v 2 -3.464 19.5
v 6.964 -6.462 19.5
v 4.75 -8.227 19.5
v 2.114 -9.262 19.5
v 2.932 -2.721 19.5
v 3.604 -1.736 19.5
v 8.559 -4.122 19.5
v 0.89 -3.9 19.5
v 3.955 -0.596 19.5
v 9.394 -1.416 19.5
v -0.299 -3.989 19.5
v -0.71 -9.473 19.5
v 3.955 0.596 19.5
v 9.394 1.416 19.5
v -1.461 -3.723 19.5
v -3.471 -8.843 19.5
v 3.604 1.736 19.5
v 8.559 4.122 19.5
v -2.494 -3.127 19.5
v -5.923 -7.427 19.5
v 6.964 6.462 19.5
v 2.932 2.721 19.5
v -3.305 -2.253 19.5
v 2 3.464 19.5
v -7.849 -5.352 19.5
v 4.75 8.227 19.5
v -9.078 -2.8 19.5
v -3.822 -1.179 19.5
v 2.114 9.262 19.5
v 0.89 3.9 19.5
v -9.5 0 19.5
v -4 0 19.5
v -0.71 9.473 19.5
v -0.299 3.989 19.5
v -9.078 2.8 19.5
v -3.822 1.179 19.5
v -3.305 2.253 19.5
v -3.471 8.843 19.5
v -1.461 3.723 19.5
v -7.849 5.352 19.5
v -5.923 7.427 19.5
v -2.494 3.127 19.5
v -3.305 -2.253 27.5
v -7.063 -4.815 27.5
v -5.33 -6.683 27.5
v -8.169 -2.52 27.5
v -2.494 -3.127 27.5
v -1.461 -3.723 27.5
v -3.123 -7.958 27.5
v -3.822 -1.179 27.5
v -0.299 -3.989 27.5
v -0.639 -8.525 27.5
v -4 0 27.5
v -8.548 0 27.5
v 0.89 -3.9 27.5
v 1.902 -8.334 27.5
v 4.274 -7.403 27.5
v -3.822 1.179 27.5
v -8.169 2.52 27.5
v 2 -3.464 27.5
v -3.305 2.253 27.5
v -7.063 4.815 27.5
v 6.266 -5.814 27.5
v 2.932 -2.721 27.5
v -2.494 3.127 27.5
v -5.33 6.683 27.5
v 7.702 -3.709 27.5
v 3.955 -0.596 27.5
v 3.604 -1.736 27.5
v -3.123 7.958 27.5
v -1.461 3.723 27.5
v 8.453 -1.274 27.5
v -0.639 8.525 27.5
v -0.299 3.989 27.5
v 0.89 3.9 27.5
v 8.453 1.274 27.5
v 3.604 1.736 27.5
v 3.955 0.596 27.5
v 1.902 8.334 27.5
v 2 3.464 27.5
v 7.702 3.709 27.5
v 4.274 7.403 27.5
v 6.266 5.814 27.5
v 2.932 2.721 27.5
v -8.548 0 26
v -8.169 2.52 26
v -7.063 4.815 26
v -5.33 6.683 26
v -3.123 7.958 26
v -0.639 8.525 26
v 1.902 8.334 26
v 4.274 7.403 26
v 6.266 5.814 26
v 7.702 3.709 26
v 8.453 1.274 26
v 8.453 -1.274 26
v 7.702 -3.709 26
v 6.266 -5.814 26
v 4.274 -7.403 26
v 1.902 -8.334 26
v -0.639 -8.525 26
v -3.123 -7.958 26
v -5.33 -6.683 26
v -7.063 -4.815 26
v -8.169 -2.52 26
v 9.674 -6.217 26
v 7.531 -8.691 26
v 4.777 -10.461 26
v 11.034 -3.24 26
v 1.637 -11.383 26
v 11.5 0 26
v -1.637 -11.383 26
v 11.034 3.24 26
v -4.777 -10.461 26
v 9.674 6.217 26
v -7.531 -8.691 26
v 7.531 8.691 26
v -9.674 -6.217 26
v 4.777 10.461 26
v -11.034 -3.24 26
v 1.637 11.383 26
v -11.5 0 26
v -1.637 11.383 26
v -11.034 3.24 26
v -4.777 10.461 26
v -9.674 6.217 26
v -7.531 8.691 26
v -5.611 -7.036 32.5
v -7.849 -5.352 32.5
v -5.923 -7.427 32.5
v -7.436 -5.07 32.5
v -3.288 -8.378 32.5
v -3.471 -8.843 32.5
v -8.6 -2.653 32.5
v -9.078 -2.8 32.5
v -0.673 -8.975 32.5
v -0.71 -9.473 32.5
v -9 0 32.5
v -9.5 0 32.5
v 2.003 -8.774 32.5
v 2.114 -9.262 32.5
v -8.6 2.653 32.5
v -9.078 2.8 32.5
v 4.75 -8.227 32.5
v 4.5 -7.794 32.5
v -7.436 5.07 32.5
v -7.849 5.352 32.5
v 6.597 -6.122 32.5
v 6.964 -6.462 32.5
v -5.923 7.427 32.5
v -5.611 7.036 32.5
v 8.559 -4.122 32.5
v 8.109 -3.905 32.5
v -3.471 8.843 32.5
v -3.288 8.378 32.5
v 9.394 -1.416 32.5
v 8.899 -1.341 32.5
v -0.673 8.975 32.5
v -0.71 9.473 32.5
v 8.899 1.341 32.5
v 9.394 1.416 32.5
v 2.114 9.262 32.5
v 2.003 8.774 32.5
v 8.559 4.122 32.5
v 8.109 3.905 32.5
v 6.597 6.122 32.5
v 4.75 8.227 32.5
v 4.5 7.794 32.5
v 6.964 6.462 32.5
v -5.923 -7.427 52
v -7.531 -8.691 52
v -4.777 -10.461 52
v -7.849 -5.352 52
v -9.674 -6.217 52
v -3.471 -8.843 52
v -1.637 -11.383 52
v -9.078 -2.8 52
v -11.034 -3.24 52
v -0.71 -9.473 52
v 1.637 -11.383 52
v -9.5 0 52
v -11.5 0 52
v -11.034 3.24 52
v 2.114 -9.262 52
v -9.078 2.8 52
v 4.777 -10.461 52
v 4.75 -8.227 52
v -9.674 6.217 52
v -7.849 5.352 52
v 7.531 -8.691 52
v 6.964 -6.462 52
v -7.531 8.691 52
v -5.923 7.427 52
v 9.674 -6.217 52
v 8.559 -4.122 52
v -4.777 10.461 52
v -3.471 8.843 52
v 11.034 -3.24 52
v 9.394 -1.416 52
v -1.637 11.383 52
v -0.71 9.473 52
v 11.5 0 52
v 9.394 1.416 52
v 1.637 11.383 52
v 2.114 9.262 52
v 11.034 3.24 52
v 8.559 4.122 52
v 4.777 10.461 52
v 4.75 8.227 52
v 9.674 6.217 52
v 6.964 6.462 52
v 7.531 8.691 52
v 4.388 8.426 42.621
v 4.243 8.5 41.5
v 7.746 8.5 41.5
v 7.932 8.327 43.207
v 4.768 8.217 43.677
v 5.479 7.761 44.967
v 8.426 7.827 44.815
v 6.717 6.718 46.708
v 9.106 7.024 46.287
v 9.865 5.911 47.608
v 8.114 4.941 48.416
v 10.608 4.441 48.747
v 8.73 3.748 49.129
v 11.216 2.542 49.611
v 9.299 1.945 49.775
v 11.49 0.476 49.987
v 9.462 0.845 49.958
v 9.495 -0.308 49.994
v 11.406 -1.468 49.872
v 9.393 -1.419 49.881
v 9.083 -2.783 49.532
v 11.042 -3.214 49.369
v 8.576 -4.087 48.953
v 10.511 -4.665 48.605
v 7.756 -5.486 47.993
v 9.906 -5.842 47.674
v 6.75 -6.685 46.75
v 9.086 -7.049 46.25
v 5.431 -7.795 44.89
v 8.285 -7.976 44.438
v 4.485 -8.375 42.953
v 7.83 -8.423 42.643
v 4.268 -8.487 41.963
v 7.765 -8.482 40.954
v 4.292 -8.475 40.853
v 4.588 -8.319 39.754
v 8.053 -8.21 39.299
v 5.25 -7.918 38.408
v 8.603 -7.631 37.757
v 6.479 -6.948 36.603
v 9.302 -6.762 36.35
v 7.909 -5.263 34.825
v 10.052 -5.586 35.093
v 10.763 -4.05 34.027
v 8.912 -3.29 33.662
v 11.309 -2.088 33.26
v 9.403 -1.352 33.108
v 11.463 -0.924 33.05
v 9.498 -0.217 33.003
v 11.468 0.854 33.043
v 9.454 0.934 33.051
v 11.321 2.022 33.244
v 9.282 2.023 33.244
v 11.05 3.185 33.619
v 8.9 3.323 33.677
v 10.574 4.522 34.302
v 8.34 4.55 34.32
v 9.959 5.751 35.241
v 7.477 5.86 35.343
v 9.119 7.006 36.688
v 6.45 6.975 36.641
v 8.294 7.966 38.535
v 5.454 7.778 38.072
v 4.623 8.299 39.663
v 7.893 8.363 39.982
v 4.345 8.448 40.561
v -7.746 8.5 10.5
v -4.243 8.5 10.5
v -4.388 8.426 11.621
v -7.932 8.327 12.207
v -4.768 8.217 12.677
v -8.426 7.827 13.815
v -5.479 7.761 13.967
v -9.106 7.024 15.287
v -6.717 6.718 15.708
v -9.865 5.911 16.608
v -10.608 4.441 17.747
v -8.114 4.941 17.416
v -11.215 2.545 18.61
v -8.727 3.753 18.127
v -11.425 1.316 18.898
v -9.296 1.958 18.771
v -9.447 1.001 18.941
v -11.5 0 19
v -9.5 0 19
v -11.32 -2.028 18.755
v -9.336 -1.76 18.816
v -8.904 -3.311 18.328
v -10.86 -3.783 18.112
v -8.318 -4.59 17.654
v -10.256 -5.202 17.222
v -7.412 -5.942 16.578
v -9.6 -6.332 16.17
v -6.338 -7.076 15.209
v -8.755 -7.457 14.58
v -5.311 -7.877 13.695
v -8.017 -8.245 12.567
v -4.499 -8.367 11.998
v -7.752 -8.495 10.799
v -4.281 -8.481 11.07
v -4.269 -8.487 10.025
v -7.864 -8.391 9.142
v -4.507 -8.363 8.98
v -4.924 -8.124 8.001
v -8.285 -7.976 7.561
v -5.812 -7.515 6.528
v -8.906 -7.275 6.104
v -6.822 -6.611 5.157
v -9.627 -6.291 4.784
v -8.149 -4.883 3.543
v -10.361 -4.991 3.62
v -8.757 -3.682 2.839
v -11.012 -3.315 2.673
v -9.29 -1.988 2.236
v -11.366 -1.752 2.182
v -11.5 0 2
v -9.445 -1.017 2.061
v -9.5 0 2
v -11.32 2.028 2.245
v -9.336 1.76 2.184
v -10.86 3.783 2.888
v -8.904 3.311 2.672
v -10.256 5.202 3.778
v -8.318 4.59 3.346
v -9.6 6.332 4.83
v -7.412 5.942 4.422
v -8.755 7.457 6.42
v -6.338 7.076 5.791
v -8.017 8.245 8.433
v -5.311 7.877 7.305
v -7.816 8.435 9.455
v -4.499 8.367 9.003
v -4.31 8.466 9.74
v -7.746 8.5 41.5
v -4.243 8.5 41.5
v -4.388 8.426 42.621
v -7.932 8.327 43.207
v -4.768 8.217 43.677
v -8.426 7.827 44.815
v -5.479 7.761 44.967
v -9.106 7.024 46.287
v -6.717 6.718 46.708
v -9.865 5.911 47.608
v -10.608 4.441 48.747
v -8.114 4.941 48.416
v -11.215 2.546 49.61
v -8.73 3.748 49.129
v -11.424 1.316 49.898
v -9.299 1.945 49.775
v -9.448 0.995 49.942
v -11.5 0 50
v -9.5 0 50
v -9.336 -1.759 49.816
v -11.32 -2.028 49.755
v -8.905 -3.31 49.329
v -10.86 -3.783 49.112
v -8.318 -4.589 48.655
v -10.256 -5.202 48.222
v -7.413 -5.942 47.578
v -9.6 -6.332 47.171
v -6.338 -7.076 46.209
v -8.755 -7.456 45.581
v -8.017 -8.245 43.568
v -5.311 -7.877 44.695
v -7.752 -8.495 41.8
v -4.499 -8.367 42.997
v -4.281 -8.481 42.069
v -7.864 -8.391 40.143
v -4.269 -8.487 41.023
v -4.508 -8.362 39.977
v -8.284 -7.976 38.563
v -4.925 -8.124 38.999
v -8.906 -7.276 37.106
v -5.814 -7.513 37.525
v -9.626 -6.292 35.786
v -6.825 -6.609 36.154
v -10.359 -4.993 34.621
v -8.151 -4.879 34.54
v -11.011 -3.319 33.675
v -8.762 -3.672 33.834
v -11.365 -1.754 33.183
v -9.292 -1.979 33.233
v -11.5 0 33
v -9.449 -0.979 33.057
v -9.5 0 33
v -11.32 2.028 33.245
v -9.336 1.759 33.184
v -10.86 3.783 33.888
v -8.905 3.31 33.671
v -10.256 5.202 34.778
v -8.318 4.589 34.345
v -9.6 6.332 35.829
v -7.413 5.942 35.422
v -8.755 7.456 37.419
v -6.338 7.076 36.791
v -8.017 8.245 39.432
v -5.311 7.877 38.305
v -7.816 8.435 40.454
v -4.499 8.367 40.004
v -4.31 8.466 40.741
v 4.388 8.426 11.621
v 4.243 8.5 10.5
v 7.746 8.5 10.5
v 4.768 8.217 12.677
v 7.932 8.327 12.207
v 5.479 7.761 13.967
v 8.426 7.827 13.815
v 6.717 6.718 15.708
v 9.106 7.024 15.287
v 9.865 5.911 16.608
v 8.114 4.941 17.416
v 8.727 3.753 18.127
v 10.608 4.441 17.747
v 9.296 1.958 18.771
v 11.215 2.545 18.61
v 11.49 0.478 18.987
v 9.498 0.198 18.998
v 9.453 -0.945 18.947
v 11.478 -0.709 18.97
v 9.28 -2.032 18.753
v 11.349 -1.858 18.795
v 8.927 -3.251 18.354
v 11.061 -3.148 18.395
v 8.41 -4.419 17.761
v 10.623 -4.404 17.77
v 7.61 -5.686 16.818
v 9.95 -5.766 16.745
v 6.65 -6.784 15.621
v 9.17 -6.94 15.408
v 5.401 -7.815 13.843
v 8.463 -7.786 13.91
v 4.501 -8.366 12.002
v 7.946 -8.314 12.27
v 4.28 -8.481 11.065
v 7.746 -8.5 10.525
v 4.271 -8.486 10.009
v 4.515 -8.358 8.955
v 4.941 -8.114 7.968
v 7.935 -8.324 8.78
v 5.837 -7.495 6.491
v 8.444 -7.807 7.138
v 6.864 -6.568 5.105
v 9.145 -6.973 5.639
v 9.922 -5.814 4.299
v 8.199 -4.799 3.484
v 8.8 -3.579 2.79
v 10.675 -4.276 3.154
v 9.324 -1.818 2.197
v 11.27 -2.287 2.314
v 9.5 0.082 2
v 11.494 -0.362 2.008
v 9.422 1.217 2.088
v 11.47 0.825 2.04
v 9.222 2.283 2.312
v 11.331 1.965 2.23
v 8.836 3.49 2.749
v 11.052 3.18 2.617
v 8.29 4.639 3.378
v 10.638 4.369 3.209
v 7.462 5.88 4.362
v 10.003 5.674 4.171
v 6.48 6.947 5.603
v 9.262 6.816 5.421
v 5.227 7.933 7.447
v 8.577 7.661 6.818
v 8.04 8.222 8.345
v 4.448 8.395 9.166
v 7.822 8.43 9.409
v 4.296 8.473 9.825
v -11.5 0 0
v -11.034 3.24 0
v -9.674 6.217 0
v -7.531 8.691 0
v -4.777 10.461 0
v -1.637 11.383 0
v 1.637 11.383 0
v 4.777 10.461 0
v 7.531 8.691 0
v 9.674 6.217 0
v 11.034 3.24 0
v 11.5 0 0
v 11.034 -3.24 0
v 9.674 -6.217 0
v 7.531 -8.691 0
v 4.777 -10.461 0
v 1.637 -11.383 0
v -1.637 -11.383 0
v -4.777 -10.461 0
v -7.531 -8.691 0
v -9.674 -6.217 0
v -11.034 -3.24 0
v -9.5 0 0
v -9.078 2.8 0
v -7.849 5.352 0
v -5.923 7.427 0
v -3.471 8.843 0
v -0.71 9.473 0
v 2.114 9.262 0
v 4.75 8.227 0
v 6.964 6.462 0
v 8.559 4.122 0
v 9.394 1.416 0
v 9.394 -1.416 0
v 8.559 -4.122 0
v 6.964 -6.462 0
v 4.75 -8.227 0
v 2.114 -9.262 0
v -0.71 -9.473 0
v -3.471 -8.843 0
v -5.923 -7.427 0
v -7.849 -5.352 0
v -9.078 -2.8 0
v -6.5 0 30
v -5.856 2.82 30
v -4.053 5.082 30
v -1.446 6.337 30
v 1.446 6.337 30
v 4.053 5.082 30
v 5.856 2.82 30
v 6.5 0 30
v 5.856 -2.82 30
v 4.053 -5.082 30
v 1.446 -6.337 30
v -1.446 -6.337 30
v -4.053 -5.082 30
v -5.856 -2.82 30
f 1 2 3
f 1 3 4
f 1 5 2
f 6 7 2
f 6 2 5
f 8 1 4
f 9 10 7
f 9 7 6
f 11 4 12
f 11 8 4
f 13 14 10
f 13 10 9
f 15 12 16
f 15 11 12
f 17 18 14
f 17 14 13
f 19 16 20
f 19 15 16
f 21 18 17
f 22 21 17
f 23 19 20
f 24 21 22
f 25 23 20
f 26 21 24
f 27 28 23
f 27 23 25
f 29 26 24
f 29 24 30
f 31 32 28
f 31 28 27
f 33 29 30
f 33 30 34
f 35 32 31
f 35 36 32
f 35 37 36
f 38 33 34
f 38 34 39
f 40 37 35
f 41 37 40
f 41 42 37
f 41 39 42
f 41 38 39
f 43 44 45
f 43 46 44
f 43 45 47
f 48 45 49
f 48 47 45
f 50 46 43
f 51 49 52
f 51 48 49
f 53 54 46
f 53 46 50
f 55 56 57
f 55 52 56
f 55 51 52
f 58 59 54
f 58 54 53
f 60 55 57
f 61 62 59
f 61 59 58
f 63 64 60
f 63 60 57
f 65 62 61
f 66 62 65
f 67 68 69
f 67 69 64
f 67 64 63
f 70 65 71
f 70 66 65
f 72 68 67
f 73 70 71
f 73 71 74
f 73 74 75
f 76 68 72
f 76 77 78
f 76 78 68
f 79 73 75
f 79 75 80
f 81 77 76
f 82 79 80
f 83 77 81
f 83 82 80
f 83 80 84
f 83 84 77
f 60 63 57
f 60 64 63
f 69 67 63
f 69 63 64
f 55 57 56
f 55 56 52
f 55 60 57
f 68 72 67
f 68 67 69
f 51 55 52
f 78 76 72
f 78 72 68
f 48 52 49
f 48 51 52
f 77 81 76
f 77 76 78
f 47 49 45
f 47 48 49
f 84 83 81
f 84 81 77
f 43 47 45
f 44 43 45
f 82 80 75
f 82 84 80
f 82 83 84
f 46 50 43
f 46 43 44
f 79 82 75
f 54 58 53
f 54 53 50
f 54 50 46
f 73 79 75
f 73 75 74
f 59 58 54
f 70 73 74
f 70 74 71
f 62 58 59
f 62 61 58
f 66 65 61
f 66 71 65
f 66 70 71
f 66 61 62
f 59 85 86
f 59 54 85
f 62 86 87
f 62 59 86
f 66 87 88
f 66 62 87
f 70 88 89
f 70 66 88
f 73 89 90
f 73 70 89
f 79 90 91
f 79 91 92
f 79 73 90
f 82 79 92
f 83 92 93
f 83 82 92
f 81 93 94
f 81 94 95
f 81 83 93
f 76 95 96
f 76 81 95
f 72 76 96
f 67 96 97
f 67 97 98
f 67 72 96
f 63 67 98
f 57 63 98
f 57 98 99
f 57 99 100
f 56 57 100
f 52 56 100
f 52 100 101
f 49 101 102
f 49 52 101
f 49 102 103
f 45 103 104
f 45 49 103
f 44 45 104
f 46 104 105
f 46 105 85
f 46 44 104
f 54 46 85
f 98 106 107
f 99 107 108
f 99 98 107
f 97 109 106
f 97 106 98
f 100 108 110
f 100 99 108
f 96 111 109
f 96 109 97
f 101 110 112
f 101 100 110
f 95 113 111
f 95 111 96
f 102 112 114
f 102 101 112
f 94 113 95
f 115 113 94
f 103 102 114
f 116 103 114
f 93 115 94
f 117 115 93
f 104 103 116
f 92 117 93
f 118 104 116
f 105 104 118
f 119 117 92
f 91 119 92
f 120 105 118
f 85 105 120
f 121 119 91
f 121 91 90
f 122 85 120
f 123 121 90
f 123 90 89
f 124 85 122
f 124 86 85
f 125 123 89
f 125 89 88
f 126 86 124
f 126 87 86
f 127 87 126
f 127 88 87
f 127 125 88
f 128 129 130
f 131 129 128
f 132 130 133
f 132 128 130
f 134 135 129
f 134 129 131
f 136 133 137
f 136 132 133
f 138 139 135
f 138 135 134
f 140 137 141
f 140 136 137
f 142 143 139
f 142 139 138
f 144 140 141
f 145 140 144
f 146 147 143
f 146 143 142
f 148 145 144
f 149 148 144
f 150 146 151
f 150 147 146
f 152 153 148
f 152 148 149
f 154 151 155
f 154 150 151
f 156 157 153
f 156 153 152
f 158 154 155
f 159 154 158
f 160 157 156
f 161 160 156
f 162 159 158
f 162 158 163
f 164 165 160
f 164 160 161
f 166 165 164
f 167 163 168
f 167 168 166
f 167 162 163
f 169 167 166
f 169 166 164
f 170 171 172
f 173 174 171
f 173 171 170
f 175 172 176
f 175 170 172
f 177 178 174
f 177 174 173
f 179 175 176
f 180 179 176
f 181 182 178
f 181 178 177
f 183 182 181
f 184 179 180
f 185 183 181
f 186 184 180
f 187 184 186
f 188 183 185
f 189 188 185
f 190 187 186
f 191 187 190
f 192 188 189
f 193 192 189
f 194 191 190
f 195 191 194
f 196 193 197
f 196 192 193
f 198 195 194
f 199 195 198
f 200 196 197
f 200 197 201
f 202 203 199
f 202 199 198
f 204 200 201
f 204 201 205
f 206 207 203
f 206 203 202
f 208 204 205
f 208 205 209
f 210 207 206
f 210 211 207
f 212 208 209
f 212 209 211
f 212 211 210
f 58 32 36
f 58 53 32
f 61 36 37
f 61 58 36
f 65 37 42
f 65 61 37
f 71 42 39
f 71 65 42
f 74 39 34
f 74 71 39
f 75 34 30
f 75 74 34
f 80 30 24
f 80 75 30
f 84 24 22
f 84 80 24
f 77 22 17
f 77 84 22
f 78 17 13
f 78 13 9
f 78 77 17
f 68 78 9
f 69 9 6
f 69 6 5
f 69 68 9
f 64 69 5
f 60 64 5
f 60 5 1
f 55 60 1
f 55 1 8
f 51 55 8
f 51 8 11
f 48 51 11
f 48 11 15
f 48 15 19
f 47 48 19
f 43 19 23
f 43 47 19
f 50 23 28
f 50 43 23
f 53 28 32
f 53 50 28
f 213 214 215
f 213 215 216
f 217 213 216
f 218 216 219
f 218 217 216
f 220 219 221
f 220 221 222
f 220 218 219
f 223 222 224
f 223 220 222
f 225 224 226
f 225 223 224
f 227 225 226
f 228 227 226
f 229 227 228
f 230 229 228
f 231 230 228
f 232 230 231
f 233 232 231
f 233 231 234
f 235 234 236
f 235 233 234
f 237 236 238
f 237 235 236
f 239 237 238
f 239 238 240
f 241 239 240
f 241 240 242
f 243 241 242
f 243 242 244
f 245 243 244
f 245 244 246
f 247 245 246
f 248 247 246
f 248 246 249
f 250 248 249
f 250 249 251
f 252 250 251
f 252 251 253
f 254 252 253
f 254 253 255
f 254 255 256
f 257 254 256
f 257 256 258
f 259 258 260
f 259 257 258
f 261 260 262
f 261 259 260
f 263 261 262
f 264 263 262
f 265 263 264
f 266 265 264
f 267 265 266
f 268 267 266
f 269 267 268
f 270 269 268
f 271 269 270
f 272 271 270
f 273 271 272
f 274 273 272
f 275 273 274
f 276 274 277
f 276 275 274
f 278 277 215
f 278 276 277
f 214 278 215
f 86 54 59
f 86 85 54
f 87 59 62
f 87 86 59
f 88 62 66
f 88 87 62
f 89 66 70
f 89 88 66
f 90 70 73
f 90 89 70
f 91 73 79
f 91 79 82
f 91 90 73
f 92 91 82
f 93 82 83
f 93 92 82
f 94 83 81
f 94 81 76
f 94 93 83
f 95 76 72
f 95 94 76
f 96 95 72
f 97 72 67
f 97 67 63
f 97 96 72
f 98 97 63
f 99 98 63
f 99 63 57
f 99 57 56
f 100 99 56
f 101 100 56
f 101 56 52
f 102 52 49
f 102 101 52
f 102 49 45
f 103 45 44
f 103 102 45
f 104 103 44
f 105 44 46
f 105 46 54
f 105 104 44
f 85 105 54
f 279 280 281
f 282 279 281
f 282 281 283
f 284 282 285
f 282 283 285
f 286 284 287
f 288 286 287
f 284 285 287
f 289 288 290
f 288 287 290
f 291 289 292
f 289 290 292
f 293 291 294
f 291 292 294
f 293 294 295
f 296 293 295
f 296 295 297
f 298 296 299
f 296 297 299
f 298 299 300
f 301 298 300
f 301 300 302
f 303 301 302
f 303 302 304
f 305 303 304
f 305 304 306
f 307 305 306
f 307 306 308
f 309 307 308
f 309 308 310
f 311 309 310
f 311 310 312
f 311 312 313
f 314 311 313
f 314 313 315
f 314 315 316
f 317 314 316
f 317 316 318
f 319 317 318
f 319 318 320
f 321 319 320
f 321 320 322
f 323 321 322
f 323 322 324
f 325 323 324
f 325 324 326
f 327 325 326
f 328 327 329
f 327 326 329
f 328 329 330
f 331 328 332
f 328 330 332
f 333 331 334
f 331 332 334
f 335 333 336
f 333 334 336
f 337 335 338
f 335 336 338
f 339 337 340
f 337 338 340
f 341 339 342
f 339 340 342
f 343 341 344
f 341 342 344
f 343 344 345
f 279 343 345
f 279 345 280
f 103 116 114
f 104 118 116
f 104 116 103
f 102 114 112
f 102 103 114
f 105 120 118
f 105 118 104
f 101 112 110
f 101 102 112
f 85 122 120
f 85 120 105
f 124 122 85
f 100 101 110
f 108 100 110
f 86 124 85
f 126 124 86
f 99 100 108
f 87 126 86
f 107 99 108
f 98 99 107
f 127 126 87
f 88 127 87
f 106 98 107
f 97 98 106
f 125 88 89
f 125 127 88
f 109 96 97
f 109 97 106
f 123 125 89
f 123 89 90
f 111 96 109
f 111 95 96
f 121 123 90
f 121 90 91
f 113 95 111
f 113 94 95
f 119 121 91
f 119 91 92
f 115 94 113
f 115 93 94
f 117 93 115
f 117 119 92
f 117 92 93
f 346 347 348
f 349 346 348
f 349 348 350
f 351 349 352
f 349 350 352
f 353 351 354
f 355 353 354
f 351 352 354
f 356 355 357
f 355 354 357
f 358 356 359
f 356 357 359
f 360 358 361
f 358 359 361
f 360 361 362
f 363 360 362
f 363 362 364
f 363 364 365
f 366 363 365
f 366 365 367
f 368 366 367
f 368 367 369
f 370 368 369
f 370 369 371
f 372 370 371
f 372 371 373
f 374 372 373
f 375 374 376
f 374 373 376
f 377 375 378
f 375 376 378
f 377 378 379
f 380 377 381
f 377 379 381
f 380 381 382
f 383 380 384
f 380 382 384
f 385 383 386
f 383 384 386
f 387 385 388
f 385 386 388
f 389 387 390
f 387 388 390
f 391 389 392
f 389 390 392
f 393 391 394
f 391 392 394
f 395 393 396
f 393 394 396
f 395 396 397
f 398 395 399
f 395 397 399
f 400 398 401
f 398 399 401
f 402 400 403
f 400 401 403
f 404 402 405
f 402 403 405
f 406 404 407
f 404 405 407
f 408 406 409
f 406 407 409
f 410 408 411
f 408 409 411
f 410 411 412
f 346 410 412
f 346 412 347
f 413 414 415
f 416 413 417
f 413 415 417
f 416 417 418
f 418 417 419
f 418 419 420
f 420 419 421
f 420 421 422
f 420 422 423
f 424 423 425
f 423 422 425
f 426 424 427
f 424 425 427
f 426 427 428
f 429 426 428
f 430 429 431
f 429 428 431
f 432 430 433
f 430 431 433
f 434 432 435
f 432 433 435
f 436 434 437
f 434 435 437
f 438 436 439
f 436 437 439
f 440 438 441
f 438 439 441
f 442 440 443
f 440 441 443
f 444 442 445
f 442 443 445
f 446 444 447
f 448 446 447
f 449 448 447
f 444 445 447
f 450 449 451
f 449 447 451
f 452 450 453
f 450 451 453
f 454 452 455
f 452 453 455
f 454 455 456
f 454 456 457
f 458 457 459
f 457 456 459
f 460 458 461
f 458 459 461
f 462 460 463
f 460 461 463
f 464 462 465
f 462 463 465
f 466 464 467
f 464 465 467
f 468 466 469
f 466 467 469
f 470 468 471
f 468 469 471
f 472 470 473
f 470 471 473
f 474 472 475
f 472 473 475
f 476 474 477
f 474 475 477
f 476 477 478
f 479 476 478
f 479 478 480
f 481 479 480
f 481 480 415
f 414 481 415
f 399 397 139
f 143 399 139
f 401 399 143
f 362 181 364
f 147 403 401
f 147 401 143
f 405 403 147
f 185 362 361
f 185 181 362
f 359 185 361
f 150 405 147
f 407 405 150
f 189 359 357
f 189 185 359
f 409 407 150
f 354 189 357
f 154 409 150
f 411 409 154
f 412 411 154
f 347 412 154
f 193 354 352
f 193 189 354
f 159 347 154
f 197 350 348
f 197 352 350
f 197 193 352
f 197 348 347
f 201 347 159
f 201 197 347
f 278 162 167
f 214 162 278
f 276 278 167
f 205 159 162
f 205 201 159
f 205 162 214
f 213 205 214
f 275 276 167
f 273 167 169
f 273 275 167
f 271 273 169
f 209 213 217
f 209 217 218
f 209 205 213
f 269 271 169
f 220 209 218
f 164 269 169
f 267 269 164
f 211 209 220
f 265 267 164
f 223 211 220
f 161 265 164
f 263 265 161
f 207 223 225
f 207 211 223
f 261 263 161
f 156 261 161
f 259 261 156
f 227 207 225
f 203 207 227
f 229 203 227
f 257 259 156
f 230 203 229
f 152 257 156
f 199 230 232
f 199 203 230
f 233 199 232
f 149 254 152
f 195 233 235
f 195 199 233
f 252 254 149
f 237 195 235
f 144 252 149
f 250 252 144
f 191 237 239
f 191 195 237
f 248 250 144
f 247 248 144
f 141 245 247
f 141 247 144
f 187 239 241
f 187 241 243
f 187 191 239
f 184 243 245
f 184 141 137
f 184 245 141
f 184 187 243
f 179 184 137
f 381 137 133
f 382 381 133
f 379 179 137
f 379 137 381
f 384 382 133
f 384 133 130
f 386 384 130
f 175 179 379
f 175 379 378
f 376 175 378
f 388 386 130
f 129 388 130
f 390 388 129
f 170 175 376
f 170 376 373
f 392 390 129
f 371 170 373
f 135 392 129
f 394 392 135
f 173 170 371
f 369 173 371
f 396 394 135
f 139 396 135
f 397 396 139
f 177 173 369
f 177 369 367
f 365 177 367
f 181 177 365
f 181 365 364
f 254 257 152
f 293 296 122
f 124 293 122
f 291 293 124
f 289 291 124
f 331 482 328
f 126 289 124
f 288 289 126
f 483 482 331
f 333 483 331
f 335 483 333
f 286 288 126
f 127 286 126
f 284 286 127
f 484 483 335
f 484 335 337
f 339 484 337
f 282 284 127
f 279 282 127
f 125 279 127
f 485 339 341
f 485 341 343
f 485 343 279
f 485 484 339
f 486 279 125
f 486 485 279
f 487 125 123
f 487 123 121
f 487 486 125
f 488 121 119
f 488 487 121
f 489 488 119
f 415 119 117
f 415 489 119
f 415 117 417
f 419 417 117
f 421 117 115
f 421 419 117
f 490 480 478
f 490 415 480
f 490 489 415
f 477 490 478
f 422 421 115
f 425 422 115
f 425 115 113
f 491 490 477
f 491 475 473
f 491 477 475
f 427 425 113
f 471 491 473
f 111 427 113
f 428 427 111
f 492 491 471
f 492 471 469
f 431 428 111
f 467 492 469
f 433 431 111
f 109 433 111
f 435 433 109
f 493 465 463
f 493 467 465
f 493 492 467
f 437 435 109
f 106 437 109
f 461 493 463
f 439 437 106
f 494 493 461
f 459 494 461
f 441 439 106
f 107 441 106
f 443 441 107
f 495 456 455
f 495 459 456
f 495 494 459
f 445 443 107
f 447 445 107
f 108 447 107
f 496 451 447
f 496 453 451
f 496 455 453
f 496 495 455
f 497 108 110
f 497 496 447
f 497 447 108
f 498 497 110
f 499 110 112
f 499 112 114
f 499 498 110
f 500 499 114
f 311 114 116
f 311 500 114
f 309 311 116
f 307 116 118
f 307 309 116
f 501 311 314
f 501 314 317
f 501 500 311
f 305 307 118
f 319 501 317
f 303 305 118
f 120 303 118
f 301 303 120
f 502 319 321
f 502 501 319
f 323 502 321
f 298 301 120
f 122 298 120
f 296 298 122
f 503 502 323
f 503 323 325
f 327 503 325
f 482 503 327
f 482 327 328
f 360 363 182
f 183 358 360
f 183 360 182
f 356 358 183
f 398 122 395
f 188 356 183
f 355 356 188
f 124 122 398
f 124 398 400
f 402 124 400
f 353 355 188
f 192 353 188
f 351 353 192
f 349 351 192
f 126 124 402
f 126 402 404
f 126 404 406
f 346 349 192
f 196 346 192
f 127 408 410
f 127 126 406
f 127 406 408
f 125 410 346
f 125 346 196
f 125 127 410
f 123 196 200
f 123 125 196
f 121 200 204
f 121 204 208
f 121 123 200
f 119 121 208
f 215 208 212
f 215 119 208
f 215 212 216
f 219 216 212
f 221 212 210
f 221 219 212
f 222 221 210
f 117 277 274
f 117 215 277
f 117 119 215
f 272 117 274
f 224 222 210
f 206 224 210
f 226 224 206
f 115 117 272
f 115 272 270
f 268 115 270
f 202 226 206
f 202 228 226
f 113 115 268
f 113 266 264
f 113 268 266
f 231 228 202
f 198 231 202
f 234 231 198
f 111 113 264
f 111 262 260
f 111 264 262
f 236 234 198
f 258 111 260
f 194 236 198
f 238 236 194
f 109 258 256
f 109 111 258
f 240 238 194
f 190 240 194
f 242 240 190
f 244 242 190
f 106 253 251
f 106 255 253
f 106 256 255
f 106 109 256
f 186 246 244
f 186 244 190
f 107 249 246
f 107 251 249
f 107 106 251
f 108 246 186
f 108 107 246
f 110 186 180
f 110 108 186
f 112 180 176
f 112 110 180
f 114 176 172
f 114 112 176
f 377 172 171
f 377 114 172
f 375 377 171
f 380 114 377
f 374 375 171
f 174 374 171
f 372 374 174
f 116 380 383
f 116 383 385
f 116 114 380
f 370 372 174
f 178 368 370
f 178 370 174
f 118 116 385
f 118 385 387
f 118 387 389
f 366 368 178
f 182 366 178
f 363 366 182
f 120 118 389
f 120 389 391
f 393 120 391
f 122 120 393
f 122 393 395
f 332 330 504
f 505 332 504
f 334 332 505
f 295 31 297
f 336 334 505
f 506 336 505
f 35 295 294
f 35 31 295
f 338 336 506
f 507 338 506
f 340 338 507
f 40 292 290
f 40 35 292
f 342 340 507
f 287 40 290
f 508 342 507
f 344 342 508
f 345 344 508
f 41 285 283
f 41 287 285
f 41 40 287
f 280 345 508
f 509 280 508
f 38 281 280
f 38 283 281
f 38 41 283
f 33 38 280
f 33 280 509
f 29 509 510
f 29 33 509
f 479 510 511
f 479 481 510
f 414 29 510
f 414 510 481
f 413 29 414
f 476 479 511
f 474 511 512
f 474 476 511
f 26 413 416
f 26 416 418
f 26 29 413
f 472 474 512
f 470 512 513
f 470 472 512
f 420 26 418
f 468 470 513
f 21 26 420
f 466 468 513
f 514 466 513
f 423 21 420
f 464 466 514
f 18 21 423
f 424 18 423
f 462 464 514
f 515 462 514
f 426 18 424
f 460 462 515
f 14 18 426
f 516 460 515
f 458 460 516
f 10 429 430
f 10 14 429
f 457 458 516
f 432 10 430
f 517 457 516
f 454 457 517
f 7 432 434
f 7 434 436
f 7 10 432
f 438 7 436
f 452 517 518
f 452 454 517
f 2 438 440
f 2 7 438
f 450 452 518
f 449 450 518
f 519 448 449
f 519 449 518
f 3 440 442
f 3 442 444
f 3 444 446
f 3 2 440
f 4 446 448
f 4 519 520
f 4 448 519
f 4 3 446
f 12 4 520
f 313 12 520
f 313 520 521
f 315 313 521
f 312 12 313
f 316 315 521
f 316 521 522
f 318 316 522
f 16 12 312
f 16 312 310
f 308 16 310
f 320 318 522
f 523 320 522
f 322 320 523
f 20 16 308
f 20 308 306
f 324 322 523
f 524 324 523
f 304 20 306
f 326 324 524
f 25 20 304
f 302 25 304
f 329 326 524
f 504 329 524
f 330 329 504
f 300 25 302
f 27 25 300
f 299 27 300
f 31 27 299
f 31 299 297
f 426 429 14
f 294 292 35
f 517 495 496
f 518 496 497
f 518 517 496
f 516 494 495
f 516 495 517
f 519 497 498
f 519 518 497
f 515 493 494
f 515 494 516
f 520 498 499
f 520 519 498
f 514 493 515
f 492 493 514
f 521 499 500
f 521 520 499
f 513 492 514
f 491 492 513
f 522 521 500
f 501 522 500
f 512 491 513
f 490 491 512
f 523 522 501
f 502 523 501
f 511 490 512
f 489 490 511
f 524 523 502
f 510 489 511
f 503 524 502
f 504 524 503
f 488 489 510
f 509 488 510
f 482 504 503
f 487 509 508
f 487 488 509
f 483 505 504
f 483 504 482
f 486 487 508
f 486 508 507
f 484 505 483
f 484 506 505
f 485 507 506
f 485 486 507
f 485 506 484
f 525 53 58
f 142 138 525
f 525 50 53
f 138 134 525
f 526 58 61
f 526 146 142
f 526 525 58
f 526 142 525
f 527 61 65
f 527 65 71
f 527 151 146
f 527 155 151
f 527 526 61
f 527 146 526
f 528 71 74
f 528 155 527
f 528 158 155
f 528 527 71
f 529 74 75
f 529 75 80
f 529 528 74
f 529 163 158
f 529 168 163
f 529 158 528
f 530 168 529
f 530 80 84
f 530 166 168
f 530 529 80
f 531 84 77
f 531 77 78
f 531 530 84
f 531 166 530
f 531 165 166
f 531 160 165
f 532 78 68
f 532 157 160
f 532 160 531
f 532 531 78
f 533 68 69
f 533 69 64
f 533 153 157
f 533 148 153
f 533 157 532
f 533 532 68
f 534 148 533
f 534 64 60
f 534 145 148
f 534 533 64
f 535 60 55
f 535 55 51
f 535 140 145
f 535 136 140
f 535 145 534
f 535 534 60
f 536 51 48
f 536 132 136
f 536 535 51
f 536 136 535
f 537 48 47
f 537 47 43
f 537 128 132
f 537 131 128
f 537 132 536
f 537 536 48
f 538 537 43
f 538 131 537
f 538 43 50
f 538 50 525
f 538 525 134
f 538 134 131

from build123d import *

# Parameters (mm, degrees)
F3_R     = 8.5
F4_DEPTH = 27.1


with BuildPart() as f1:
    # F0 (on Front) → F1 (revolve)
    with BuildSketch(Plane.XZ):
        Polygon((-11.5, 52), (-11.5, 26), (-8.5484226346, 26), (-8.5484226346, 27.5), (-4, 27.5), (-9, 32.5), (-9.5, 32.5), (-9.5, 52), align=None)
    revolve(axis=Axis((0, 0, 16.25), (0, 0, -1)))


with BuildPart() as f2:
    # F0 (on Front) → F2 (revolve)
    with BuildSketch(Plane.XZ):
        Polygon((-11.5, 0), (-9.5, 0), (-9.5, 19.5), (-4, 19.5), (-4, 27.5), (-8.5484226346, 27.5), (-8.5484226346, 26), (-11.5, 26), align=None)
    revolve(axis=Axis((0, 0, 16.25), (0, 0, -1)))


with BuildPart() as f4_tool:
    # F3 (on Right) → F4 (new body, symmetric)
    with BuildSketch(Plane.YZ):
        with Locations((0, 41.5)):
            Circle(F3_R)
        with Locations((0, 10.5)):
            Circle(F3_R)
    extrude(amount=F4_DEPTH, both=True)


with BuildPart() as f1_1:
    add(f1.part)

    # F4: cut by f4_tool
    add(f4_tool.part, mode=Mode.SUBTRACT)


with BuildPart() as f2_1:
    add(f2.part)

    # F4: cut by f4_tool
    add(f4_tool.part, mode=Mode.SUBTRACT)


solid = Compound([f1_1.part, f2_1.part])
